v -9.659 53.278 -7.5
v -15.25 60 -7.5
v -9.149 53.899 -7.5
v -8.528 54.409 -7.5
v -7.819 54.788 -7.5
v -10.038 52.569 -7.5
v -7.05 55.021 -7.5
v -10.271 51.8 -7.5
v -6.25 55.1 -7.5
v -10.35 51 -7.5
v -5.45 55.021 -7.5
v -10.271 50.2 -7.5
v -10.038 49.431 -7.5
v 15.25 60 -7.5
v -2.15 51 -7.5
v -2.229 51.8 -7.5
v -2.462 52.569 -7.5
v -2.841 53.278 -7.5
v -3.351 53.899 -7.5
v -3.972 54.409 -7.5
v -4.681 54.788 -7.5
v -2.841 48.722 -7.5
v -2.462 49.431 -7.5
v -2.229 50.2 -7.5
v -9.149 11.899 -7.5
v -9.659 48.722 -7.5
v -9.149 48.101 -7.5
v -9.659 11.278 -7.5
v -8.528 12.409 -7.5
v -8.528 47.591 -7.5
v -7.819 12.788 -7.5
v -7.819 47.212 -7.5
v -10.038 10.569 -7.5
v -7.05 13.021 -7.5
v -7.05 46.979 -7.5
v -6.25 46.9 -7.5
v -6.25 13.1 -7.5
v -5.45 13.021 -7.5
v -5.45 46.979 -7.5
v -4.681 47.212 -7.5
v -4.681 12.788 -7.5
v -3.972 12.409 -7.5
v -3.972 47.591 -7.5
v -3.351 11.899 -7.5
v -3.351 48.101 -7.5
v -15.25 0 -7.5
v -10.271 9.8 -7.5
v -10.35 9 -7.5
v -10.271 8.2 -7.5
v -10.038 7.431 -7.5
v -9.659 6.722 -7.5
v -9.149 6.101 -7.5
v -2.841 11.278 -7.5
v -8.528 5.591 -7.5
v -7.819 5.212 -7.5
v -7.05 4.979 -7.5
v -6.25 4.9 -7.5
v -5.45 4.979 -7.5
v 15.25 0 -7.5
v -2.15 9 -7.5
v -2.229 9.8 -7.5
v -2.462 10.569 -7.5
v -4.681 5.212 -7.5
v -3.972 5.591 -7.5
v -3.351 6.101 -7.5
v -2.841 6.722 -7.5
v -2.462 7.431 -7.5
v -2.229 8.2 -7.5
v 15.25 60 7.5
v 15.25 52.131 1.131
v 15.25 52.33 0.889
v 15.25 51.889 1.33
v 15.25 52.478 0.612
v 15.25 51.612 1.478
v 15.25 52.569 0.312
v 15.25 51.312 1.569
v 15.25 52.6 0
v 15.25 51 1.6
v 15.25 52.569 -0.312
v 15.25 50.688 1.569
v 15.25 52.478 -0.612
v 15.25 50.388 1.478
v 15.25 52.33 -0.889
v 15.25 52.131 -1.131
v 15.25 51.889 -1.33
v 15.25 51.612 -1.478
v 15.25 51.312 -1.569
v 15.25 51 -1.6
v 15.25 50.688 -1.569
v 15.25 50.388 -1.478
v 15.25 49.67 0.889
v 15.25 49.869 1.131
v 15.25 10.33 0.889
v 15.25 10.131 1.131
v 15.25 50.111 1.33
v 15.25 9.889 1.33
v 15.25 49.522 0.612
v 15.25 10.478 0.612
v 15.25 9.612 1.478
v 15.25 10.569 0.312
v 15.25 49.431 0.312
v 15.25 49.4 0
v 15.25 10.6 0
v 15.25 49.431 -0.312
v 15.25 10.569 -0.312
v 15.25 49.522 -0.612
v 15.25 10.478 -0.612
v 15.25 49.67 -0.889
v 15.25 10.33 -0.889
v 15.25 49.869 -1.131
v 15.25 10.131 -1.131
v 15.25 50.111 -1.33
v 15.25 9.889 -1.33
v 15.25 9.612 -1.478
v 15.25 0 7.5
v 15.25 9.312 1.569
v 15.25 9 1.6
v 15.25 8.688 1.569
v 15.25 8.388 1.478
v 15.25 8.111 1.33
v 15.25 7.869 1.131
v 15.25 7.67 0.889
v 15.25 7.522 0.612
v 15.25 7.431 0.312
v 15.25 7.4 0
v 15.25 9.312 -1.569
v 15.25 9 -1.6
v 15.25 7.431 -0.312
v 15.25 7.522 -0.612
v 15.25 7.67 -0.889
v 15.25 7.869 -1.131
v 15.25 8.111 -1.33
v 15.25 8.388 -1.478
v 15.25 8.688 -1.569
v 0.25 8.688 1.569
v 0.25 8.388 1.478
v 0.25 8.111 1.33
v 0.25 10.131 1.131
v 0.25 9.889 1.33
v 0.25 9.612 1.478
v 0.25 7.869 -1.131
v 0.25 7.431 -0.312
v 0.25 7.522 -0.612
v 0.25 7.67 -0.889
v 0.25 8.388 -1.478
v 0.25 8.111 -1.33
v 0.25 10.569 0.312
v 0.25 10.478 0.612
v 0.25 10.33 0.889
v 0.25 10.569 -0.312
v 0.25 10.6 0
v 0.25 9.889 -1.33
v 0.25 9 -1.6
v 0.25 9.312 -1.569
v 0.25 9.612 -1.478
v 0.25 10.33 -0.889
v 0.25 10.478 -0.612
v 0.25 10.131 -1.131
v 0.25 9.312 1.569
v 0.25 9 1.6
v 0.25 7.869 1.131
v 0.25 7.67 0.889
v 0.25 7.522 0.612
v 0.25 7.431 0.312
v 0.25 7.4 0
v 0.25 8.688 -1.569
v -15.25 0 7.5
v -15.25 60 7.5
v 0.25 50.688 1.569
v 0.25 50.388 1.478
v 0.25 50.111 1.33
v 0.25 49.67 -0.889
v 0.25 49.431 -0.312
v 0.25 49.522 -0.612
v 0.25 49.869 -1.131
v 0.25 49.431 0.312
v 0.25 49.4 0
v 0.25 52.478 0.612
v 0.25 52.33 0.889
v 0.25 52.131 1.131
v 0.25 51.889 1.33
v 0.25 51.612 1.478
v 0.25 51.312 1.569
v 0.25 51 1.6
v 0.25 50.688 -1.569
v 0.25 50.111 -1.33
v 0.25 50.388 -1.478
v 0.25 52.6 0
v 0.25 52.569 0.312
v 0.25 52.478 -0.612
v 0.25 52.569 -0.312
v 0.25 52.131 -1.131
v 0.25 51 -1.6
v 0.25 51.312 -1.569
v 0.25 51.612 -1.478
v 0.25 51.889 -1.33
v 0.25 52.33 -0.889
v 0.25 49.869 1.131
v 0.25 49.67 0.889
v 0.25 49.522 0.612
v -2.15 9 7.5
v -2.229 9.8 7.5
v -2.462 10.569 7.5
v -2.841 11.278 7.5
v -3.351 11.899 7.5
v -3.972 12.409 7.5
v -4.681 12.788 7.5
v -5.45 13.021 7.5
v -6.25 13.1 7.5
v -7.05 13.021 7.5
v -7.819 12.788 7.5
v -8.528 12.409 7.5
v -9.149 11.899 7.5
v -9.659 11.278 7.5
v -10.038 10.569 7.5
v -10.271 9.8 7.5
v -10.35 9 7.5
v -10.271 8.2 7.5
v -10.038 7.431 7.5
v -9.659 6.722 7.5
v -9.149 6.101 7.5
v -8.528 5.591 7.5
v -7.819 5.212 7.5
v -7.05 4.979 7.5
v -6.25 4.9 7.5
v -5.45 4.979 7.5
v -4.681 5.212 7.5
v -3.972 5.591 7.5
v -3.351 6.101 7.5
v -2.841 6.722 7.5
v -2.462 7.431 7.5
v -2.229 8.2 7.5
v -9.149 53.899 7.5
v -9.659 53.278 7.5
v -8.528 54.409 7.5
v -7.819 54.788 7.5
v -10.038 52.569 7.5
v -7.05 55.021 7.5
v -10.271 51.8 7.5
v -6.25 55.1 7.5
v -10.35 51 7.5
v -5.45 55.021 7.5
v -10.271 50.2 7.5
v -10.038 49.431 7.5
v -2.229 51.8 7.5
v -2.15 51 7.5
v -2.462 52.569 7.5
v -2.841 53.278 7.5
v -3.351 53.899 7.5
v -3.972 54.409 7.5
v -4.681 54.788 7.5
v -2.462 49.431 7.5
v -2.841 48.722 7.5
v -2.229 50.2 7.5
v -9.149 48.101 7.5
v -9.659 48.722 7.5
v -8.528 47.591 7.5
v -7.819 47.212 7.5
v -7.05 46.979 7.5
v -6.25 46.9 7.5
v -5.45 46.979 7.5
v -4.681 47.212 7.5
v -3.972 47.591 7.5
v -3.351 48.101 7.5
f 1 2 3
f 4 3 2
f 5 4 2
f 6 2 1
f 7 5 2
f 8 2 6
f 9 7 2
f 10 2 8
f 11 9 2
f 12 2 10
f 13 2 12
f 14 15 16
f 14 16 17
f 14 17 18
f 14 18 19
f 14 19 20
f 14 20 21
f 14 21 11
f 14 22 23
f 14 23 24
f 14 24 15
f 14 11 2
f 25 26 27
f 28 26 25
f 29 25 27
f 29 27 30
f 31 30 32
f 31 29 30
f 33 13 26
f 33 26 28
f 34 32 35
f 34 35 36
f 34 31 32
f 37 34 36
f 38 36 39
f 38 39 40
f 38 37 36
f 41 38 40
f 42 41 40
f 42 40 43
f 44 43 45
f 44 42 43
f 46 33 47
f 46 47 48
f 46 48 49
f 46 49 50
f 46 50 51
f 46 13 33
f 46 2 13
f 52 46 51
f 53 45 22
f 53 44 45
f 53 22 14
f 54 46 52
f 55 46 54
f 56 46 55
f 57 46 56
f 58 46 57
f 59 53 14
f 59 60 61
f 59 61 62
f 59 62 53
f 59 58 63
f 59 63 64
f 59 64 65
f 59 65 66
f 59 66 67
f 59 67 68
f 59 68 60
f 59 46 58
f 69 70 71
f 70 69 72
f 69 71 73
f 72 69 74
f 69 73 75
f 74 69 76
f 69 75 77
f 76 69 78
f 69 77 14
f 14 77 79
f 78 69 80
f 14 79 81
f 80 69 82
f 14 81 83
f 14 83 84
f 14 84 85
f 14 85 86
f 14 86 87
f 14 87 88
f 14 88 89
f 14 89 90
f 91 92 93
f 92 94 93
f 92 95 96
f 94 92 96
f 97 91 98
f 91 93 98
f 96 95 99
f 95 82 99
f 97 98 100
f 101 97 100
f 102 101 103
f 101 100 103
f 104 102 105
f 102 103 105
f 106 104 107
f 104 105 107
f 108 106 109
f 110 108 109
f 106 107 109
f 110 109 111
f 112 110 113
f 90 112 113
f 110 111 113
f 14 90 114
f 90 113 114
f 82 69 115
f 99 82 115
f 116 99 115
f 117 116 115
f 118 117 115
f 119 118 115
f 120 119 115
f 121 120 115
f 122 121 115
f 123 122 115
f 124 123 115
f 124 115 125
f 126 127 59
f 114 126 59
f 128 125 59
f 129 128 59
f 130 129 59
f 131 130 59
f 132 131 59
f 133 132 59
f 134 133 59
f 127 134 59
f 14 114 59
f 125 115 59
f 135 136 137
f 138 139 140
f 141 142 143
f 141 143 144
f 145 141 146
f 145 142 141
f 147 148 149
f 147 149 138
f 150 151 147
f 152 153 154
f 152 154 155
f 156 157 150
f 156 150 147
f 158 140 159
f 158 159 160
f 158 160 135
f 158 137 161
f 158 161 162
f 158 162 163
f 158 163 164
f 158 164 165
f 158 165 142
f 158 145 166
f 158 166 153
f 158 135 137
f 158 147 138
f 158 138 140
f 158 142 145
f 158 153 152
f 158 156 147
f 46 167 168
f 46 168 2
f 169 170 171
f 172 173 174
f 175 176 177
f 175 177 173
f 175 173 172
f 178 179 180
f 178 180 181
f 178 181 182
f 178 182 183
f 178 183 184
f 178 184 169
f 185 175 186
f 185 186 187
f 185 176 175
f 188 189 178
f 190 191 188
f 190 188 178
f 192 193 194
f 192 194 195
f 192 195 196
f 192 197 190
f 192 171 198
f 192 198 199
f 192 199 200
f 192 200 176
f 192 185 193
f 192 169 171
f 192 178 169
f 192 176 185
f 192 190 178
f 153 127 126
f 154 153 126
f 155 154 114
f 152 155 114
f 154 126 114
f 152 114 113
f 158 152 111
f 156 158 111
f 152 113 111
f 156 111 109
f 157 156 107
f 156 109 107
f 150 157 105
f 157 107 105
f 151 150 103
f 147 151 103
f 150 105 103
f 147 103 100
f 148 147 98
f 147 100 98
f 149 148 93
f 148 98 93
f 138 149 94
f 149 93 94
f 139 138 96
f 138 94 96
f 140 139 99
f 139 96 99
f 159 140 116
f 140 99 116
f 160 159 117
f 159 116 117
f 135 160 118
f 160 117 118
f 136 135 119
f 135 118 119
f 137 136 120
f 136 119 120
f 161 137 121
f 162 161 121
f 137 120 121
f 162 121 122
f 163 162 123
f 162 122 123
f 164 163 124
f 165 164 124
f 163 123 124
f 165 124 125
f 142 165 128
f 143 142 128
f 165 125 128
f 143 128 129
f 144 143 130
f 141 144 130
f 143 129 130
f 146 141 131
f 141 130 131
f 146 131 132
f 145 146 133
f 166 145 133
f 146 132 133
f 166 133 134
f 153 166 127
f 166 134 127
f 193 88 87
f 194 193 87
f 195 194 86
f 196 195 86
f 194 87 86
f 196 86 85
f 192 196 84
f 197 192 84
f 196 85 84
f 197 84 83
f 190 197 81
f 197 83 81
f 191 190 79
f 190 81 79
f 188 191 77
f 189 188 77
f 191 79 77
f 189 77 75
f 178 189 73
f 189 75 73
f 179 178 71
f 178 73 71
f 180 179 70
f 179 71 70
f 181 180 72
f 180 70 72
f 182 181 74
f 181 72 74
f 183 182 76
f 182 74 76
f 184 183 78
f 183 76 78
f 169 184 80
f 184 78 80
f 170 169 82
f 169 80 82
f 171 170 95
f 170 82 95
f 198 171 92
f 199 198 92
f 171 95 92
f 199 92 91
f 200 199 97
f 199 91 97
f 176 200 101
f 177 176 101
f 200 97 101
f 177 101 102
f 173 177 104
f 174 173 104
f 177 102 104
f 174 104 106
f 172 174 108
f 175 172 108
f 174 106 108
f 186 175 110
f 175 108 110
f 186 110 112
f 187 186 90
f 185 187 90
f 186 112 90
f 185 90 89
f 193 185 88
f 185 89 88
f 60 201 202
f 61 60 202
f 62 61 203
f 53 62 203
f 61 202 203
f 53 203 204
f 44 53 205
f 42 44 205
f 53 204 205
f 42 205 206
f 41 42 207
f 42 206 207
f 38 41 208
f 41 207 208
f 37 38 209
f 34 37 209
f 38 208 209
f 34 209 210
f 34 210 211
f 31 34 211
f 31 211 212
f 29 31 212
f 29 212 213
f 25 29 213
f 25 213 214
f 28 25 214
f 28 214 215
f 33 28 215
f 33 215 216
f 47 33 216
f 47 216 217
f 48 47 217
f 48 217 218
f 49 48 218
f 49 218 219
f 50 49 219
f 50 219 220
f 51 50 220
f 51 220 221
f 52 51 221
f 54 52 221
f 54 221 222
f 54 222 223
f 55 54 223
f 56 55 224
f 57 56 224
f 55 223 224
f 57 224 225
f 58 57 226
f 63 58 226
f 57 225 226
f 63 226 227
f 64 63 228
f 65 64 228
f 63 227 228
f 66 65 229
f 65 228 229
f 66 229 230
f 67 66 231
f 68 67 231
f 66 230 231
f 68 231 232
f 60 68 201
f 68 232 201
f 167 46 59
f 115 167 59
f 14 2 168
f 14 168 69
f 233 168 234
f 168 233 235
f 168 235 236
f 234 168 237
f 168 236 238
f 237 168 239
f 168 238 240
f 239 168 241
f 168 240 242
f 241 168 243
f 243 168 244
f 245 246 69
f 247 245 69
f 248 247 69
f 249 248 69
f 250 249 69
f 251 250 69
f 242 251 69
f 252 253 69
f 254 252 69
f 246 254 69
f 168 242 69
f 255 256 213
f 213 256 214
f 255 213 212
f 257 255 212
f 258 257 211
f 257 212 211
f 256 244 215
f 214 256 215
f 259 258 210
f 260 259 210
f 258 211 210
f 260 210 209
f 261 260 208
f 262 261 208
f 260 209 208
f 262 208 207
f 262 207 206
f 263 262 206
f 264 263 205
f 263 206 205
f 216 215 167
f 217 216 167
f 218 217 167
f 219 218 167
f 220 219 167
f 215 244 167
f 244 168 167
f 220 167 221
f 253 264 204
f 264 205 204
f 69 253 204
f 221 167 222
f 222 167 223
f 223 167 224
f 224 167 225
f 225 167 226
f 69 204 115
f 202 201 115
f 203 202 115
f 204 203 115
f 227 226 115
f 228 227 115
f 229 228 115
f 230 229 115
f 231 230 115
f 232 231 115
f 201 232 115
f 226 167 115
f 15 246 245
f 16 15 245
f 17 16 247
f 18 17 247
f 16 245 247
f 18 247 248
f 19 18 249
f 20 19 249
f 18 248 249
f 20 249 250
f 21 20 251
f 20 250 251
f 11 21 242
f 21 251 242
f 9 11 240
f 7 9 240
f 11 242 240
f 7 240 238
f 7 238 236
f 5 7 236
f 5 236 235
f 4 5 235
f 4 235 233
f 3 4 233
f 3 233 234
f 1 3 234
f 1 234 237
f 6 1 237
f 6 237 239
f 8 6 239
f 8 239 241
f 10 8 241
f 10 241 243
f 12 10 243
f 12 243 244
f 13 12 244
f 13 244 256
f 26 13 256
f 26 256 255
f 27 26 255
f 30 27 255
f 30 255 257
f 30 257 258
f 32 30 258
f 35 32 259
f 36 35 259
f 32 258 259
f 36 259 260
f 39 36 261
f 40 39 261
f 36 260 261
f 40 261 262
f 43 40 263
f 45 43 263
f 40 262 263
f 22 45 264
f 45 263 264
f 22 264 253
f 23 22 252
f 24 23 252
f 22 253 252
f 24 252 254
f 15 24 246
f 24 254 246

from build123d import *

# Parameters (mm, degrees)
SKETCH1_W           = 30.5
SKETCH1_H           = 15
BOSS_EXTRUDE1_DEPTH = 60
SKETCH2_R           = 4.1
CUT_EXTRUDE1_DEPTH  = 16
SKETCH3_R           = 1.6
CUT_EXTRUDE2_DEPTH  = 15


with BuildPart() as part:
    # Sketch1 → Boss-Extrude1 (new body)
    with BuildSketch(Plane(origin=(0, 0, 0), x_dir=(1, 0, 0), z_dir=(0, 1, 0))):
        Rectangle(SKETCH1_W, SKETCH1_H)
    extrude(amount=BOSS_EXTRUDE1_DEPTH)

    # Sketch2 → Cut-Extrude1 (cut, through all)
    with BuildSketch(Plane.XY.offset(7.5)):
        with Locations((-6.25, 51)):
            Circle(SKETCH2_R)
        with Locations((-6.25, 9)):
            Circle(SKETCH2_R)
    extrude(amount=-CUT_EXTRUDE1_DEPTH, mode=Mode.SUBTRACT)

    # Sketch3 → Cut-Extrude2 (cut)
    with BuildSketch(Plane(origin=(15.25, 0, 0), x_dir=(0, 0, -1), z_dir=(1, 0, 0))):
        with Locations((0, 51)):
            Circle(SKETCH3_R)
        with Locations((0, 9)):
            Circle(SKETCH3_R)
    extrude(amount=-CUT_EXTRUDE2_DEPTH, mode=Mode.SUBTRACT)


solid = part.part
